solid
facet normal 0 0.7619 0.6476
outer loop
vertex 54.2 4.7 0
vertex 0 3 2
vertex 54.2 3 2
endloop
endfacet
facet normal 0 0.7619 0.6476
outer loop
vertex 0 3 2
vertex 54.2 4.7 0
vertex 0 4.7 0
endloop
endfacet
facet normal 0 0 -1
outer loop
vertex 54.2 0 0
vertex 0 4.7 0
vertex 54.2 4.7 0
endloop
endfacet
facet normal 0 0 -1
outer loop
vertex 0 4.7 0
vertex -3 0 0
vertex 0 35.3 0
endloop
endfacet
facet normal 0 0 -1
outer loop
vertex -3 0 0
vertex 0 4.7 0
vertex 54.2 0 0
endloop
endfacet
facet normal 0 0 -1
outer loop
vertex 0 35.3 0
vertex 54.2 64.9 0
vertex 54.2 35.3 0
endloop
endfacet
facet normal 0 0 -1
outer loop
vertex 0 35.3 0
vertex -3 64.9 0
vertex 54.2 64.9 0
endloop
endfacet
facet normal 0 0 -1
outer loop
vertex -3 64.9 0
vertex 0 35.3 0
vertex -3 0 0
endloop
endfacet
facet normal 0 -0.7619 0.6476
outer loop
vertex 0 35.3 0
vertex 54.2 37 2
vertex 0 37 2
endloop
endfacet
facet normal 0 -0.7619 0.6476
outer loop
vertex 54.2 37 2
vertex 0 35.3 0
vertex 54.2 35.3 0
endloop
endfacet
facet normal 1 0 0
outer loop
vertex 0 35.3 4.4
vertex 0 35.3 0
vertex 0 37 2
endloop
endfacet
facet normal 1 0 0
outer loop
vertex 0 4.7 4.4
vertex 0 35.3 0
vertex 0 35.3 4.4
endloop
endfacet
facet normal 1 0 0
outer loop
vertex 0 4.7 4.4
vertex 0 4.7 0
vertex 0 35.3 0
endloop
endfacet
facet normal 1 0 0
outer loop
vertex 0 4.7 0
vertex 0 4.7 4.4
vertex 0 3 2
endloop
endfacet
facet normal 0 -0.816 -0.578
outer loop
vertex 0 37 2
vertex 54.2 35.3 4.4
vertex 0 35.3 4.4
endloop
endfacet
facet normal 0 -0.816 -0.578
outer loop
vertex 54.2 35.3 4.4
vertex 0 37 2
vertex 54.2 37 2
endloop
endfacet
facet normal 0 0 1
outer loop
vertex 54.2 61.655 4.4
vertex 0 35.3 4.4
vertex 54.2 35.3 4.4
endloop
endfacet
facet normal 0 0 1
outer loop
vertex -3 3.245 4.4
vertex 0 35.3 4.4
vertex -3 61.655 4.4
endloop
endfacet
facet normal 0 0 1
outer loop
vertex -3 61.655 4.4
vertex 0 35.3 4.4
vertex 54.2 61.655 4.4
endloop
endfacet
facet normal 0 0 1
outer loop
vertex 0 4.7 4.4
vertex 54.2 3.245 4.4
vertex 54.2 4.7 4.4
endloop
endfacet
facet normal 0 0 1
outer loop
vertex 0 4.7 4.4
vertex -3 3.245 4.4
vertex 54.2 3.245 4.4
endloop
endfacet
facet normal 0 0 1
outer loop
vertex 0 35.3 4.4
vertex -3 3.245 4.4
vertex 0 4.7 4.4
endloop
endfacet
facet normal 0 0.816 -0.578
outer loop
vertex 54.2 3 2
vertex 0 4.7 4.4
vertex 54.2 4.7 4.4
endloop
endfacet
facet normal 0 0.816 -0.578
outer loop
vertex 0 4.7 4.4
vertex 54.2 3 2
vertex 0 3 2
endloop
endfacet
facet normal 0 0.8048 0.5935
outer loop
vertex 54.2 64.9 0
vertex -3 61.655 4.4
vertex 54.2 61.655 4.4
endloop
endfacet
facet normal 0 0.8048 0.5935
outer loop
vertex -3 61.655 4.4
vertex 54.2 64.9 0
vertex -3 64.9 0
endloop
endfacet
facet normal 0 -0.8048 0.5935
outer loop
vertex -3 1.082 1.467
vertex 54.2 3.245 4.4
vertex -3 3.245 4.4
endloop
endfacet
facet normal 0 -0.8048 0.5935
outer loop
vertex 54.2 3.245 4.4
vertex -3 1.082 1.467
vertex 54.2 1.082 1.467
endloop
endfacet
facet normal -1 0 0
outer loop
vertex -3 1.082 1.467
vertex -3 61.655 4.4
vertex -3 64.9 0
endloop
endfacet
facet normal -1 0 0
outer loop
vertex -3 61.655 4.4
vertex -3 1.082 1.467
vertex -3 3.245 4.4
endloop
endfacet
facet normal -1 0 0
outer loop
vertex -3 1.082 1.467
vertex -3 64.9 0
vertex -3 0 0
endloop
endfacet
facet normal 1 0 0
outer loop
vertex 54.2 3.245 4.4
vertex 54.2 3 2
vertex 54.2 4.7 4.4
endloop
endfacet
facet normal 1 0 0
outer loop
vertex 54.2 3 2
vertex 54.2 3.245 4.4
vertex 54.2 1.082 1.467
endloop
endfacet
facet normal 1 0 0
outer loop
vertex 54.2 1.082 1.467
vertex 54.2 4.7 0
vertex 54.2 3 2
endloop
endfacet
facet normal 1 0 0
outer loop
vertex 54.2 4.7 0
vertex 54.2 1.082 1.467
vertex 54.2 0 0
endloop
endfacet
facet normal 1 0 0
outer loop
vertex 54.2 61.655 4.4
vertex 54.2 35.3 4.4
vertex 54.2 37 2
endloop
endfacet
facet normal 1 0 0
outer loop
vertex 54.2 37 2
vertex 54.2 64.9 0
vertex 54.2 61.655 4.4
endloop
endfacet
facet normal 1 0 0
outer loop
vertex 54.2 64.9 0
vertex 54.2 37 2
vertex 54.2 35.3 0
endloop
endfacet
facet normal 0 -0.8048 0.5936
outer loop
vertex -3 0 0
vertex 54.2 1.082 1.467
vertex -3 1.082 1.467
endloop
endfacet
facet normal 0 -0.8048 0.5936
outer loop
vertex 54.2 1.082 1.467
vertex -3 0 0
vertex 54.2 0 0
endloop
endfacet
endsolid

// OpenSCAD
cw = 54+0.2; // card width
ch = 85.6+0.2; // card height
bw = 3; // border width

m = 0.1; // plug margin

th = 5.5 - m; // plate thickness
st = 4.5 - m; // slot thickness
kw = 65 - m; // slot width
ks = 0.9; // slot narrowing scale factor

lg = 1000; // large vaule

module plug() {
    translate([-bw,kw/2,0]) linear_extrude(st, scale=[1,ks])
        translate([0,-kw/2]) square([cw+bw,kw]);
}
        
 dw = 34; // bus card width
 ctl = 2; // lower bus card thickness
 ctu = st - ctl; // uppwer bus card thickness
 
 module bus_card_slot() {
     translate([lg/2,dw/2,ctl]) union() {
         mirror([0,0,1]) linear_extrude(ctl, scale=[1,0.9]) 
            square([lg, dw], center=true);
         linear_extrude(ctu, scale=[1,0.9]) 
            square([lg, dw], center=true);
     }
 }
 
 
difference() {
    plug();
    translate([0,3,0]) bus_card_slot();
}
